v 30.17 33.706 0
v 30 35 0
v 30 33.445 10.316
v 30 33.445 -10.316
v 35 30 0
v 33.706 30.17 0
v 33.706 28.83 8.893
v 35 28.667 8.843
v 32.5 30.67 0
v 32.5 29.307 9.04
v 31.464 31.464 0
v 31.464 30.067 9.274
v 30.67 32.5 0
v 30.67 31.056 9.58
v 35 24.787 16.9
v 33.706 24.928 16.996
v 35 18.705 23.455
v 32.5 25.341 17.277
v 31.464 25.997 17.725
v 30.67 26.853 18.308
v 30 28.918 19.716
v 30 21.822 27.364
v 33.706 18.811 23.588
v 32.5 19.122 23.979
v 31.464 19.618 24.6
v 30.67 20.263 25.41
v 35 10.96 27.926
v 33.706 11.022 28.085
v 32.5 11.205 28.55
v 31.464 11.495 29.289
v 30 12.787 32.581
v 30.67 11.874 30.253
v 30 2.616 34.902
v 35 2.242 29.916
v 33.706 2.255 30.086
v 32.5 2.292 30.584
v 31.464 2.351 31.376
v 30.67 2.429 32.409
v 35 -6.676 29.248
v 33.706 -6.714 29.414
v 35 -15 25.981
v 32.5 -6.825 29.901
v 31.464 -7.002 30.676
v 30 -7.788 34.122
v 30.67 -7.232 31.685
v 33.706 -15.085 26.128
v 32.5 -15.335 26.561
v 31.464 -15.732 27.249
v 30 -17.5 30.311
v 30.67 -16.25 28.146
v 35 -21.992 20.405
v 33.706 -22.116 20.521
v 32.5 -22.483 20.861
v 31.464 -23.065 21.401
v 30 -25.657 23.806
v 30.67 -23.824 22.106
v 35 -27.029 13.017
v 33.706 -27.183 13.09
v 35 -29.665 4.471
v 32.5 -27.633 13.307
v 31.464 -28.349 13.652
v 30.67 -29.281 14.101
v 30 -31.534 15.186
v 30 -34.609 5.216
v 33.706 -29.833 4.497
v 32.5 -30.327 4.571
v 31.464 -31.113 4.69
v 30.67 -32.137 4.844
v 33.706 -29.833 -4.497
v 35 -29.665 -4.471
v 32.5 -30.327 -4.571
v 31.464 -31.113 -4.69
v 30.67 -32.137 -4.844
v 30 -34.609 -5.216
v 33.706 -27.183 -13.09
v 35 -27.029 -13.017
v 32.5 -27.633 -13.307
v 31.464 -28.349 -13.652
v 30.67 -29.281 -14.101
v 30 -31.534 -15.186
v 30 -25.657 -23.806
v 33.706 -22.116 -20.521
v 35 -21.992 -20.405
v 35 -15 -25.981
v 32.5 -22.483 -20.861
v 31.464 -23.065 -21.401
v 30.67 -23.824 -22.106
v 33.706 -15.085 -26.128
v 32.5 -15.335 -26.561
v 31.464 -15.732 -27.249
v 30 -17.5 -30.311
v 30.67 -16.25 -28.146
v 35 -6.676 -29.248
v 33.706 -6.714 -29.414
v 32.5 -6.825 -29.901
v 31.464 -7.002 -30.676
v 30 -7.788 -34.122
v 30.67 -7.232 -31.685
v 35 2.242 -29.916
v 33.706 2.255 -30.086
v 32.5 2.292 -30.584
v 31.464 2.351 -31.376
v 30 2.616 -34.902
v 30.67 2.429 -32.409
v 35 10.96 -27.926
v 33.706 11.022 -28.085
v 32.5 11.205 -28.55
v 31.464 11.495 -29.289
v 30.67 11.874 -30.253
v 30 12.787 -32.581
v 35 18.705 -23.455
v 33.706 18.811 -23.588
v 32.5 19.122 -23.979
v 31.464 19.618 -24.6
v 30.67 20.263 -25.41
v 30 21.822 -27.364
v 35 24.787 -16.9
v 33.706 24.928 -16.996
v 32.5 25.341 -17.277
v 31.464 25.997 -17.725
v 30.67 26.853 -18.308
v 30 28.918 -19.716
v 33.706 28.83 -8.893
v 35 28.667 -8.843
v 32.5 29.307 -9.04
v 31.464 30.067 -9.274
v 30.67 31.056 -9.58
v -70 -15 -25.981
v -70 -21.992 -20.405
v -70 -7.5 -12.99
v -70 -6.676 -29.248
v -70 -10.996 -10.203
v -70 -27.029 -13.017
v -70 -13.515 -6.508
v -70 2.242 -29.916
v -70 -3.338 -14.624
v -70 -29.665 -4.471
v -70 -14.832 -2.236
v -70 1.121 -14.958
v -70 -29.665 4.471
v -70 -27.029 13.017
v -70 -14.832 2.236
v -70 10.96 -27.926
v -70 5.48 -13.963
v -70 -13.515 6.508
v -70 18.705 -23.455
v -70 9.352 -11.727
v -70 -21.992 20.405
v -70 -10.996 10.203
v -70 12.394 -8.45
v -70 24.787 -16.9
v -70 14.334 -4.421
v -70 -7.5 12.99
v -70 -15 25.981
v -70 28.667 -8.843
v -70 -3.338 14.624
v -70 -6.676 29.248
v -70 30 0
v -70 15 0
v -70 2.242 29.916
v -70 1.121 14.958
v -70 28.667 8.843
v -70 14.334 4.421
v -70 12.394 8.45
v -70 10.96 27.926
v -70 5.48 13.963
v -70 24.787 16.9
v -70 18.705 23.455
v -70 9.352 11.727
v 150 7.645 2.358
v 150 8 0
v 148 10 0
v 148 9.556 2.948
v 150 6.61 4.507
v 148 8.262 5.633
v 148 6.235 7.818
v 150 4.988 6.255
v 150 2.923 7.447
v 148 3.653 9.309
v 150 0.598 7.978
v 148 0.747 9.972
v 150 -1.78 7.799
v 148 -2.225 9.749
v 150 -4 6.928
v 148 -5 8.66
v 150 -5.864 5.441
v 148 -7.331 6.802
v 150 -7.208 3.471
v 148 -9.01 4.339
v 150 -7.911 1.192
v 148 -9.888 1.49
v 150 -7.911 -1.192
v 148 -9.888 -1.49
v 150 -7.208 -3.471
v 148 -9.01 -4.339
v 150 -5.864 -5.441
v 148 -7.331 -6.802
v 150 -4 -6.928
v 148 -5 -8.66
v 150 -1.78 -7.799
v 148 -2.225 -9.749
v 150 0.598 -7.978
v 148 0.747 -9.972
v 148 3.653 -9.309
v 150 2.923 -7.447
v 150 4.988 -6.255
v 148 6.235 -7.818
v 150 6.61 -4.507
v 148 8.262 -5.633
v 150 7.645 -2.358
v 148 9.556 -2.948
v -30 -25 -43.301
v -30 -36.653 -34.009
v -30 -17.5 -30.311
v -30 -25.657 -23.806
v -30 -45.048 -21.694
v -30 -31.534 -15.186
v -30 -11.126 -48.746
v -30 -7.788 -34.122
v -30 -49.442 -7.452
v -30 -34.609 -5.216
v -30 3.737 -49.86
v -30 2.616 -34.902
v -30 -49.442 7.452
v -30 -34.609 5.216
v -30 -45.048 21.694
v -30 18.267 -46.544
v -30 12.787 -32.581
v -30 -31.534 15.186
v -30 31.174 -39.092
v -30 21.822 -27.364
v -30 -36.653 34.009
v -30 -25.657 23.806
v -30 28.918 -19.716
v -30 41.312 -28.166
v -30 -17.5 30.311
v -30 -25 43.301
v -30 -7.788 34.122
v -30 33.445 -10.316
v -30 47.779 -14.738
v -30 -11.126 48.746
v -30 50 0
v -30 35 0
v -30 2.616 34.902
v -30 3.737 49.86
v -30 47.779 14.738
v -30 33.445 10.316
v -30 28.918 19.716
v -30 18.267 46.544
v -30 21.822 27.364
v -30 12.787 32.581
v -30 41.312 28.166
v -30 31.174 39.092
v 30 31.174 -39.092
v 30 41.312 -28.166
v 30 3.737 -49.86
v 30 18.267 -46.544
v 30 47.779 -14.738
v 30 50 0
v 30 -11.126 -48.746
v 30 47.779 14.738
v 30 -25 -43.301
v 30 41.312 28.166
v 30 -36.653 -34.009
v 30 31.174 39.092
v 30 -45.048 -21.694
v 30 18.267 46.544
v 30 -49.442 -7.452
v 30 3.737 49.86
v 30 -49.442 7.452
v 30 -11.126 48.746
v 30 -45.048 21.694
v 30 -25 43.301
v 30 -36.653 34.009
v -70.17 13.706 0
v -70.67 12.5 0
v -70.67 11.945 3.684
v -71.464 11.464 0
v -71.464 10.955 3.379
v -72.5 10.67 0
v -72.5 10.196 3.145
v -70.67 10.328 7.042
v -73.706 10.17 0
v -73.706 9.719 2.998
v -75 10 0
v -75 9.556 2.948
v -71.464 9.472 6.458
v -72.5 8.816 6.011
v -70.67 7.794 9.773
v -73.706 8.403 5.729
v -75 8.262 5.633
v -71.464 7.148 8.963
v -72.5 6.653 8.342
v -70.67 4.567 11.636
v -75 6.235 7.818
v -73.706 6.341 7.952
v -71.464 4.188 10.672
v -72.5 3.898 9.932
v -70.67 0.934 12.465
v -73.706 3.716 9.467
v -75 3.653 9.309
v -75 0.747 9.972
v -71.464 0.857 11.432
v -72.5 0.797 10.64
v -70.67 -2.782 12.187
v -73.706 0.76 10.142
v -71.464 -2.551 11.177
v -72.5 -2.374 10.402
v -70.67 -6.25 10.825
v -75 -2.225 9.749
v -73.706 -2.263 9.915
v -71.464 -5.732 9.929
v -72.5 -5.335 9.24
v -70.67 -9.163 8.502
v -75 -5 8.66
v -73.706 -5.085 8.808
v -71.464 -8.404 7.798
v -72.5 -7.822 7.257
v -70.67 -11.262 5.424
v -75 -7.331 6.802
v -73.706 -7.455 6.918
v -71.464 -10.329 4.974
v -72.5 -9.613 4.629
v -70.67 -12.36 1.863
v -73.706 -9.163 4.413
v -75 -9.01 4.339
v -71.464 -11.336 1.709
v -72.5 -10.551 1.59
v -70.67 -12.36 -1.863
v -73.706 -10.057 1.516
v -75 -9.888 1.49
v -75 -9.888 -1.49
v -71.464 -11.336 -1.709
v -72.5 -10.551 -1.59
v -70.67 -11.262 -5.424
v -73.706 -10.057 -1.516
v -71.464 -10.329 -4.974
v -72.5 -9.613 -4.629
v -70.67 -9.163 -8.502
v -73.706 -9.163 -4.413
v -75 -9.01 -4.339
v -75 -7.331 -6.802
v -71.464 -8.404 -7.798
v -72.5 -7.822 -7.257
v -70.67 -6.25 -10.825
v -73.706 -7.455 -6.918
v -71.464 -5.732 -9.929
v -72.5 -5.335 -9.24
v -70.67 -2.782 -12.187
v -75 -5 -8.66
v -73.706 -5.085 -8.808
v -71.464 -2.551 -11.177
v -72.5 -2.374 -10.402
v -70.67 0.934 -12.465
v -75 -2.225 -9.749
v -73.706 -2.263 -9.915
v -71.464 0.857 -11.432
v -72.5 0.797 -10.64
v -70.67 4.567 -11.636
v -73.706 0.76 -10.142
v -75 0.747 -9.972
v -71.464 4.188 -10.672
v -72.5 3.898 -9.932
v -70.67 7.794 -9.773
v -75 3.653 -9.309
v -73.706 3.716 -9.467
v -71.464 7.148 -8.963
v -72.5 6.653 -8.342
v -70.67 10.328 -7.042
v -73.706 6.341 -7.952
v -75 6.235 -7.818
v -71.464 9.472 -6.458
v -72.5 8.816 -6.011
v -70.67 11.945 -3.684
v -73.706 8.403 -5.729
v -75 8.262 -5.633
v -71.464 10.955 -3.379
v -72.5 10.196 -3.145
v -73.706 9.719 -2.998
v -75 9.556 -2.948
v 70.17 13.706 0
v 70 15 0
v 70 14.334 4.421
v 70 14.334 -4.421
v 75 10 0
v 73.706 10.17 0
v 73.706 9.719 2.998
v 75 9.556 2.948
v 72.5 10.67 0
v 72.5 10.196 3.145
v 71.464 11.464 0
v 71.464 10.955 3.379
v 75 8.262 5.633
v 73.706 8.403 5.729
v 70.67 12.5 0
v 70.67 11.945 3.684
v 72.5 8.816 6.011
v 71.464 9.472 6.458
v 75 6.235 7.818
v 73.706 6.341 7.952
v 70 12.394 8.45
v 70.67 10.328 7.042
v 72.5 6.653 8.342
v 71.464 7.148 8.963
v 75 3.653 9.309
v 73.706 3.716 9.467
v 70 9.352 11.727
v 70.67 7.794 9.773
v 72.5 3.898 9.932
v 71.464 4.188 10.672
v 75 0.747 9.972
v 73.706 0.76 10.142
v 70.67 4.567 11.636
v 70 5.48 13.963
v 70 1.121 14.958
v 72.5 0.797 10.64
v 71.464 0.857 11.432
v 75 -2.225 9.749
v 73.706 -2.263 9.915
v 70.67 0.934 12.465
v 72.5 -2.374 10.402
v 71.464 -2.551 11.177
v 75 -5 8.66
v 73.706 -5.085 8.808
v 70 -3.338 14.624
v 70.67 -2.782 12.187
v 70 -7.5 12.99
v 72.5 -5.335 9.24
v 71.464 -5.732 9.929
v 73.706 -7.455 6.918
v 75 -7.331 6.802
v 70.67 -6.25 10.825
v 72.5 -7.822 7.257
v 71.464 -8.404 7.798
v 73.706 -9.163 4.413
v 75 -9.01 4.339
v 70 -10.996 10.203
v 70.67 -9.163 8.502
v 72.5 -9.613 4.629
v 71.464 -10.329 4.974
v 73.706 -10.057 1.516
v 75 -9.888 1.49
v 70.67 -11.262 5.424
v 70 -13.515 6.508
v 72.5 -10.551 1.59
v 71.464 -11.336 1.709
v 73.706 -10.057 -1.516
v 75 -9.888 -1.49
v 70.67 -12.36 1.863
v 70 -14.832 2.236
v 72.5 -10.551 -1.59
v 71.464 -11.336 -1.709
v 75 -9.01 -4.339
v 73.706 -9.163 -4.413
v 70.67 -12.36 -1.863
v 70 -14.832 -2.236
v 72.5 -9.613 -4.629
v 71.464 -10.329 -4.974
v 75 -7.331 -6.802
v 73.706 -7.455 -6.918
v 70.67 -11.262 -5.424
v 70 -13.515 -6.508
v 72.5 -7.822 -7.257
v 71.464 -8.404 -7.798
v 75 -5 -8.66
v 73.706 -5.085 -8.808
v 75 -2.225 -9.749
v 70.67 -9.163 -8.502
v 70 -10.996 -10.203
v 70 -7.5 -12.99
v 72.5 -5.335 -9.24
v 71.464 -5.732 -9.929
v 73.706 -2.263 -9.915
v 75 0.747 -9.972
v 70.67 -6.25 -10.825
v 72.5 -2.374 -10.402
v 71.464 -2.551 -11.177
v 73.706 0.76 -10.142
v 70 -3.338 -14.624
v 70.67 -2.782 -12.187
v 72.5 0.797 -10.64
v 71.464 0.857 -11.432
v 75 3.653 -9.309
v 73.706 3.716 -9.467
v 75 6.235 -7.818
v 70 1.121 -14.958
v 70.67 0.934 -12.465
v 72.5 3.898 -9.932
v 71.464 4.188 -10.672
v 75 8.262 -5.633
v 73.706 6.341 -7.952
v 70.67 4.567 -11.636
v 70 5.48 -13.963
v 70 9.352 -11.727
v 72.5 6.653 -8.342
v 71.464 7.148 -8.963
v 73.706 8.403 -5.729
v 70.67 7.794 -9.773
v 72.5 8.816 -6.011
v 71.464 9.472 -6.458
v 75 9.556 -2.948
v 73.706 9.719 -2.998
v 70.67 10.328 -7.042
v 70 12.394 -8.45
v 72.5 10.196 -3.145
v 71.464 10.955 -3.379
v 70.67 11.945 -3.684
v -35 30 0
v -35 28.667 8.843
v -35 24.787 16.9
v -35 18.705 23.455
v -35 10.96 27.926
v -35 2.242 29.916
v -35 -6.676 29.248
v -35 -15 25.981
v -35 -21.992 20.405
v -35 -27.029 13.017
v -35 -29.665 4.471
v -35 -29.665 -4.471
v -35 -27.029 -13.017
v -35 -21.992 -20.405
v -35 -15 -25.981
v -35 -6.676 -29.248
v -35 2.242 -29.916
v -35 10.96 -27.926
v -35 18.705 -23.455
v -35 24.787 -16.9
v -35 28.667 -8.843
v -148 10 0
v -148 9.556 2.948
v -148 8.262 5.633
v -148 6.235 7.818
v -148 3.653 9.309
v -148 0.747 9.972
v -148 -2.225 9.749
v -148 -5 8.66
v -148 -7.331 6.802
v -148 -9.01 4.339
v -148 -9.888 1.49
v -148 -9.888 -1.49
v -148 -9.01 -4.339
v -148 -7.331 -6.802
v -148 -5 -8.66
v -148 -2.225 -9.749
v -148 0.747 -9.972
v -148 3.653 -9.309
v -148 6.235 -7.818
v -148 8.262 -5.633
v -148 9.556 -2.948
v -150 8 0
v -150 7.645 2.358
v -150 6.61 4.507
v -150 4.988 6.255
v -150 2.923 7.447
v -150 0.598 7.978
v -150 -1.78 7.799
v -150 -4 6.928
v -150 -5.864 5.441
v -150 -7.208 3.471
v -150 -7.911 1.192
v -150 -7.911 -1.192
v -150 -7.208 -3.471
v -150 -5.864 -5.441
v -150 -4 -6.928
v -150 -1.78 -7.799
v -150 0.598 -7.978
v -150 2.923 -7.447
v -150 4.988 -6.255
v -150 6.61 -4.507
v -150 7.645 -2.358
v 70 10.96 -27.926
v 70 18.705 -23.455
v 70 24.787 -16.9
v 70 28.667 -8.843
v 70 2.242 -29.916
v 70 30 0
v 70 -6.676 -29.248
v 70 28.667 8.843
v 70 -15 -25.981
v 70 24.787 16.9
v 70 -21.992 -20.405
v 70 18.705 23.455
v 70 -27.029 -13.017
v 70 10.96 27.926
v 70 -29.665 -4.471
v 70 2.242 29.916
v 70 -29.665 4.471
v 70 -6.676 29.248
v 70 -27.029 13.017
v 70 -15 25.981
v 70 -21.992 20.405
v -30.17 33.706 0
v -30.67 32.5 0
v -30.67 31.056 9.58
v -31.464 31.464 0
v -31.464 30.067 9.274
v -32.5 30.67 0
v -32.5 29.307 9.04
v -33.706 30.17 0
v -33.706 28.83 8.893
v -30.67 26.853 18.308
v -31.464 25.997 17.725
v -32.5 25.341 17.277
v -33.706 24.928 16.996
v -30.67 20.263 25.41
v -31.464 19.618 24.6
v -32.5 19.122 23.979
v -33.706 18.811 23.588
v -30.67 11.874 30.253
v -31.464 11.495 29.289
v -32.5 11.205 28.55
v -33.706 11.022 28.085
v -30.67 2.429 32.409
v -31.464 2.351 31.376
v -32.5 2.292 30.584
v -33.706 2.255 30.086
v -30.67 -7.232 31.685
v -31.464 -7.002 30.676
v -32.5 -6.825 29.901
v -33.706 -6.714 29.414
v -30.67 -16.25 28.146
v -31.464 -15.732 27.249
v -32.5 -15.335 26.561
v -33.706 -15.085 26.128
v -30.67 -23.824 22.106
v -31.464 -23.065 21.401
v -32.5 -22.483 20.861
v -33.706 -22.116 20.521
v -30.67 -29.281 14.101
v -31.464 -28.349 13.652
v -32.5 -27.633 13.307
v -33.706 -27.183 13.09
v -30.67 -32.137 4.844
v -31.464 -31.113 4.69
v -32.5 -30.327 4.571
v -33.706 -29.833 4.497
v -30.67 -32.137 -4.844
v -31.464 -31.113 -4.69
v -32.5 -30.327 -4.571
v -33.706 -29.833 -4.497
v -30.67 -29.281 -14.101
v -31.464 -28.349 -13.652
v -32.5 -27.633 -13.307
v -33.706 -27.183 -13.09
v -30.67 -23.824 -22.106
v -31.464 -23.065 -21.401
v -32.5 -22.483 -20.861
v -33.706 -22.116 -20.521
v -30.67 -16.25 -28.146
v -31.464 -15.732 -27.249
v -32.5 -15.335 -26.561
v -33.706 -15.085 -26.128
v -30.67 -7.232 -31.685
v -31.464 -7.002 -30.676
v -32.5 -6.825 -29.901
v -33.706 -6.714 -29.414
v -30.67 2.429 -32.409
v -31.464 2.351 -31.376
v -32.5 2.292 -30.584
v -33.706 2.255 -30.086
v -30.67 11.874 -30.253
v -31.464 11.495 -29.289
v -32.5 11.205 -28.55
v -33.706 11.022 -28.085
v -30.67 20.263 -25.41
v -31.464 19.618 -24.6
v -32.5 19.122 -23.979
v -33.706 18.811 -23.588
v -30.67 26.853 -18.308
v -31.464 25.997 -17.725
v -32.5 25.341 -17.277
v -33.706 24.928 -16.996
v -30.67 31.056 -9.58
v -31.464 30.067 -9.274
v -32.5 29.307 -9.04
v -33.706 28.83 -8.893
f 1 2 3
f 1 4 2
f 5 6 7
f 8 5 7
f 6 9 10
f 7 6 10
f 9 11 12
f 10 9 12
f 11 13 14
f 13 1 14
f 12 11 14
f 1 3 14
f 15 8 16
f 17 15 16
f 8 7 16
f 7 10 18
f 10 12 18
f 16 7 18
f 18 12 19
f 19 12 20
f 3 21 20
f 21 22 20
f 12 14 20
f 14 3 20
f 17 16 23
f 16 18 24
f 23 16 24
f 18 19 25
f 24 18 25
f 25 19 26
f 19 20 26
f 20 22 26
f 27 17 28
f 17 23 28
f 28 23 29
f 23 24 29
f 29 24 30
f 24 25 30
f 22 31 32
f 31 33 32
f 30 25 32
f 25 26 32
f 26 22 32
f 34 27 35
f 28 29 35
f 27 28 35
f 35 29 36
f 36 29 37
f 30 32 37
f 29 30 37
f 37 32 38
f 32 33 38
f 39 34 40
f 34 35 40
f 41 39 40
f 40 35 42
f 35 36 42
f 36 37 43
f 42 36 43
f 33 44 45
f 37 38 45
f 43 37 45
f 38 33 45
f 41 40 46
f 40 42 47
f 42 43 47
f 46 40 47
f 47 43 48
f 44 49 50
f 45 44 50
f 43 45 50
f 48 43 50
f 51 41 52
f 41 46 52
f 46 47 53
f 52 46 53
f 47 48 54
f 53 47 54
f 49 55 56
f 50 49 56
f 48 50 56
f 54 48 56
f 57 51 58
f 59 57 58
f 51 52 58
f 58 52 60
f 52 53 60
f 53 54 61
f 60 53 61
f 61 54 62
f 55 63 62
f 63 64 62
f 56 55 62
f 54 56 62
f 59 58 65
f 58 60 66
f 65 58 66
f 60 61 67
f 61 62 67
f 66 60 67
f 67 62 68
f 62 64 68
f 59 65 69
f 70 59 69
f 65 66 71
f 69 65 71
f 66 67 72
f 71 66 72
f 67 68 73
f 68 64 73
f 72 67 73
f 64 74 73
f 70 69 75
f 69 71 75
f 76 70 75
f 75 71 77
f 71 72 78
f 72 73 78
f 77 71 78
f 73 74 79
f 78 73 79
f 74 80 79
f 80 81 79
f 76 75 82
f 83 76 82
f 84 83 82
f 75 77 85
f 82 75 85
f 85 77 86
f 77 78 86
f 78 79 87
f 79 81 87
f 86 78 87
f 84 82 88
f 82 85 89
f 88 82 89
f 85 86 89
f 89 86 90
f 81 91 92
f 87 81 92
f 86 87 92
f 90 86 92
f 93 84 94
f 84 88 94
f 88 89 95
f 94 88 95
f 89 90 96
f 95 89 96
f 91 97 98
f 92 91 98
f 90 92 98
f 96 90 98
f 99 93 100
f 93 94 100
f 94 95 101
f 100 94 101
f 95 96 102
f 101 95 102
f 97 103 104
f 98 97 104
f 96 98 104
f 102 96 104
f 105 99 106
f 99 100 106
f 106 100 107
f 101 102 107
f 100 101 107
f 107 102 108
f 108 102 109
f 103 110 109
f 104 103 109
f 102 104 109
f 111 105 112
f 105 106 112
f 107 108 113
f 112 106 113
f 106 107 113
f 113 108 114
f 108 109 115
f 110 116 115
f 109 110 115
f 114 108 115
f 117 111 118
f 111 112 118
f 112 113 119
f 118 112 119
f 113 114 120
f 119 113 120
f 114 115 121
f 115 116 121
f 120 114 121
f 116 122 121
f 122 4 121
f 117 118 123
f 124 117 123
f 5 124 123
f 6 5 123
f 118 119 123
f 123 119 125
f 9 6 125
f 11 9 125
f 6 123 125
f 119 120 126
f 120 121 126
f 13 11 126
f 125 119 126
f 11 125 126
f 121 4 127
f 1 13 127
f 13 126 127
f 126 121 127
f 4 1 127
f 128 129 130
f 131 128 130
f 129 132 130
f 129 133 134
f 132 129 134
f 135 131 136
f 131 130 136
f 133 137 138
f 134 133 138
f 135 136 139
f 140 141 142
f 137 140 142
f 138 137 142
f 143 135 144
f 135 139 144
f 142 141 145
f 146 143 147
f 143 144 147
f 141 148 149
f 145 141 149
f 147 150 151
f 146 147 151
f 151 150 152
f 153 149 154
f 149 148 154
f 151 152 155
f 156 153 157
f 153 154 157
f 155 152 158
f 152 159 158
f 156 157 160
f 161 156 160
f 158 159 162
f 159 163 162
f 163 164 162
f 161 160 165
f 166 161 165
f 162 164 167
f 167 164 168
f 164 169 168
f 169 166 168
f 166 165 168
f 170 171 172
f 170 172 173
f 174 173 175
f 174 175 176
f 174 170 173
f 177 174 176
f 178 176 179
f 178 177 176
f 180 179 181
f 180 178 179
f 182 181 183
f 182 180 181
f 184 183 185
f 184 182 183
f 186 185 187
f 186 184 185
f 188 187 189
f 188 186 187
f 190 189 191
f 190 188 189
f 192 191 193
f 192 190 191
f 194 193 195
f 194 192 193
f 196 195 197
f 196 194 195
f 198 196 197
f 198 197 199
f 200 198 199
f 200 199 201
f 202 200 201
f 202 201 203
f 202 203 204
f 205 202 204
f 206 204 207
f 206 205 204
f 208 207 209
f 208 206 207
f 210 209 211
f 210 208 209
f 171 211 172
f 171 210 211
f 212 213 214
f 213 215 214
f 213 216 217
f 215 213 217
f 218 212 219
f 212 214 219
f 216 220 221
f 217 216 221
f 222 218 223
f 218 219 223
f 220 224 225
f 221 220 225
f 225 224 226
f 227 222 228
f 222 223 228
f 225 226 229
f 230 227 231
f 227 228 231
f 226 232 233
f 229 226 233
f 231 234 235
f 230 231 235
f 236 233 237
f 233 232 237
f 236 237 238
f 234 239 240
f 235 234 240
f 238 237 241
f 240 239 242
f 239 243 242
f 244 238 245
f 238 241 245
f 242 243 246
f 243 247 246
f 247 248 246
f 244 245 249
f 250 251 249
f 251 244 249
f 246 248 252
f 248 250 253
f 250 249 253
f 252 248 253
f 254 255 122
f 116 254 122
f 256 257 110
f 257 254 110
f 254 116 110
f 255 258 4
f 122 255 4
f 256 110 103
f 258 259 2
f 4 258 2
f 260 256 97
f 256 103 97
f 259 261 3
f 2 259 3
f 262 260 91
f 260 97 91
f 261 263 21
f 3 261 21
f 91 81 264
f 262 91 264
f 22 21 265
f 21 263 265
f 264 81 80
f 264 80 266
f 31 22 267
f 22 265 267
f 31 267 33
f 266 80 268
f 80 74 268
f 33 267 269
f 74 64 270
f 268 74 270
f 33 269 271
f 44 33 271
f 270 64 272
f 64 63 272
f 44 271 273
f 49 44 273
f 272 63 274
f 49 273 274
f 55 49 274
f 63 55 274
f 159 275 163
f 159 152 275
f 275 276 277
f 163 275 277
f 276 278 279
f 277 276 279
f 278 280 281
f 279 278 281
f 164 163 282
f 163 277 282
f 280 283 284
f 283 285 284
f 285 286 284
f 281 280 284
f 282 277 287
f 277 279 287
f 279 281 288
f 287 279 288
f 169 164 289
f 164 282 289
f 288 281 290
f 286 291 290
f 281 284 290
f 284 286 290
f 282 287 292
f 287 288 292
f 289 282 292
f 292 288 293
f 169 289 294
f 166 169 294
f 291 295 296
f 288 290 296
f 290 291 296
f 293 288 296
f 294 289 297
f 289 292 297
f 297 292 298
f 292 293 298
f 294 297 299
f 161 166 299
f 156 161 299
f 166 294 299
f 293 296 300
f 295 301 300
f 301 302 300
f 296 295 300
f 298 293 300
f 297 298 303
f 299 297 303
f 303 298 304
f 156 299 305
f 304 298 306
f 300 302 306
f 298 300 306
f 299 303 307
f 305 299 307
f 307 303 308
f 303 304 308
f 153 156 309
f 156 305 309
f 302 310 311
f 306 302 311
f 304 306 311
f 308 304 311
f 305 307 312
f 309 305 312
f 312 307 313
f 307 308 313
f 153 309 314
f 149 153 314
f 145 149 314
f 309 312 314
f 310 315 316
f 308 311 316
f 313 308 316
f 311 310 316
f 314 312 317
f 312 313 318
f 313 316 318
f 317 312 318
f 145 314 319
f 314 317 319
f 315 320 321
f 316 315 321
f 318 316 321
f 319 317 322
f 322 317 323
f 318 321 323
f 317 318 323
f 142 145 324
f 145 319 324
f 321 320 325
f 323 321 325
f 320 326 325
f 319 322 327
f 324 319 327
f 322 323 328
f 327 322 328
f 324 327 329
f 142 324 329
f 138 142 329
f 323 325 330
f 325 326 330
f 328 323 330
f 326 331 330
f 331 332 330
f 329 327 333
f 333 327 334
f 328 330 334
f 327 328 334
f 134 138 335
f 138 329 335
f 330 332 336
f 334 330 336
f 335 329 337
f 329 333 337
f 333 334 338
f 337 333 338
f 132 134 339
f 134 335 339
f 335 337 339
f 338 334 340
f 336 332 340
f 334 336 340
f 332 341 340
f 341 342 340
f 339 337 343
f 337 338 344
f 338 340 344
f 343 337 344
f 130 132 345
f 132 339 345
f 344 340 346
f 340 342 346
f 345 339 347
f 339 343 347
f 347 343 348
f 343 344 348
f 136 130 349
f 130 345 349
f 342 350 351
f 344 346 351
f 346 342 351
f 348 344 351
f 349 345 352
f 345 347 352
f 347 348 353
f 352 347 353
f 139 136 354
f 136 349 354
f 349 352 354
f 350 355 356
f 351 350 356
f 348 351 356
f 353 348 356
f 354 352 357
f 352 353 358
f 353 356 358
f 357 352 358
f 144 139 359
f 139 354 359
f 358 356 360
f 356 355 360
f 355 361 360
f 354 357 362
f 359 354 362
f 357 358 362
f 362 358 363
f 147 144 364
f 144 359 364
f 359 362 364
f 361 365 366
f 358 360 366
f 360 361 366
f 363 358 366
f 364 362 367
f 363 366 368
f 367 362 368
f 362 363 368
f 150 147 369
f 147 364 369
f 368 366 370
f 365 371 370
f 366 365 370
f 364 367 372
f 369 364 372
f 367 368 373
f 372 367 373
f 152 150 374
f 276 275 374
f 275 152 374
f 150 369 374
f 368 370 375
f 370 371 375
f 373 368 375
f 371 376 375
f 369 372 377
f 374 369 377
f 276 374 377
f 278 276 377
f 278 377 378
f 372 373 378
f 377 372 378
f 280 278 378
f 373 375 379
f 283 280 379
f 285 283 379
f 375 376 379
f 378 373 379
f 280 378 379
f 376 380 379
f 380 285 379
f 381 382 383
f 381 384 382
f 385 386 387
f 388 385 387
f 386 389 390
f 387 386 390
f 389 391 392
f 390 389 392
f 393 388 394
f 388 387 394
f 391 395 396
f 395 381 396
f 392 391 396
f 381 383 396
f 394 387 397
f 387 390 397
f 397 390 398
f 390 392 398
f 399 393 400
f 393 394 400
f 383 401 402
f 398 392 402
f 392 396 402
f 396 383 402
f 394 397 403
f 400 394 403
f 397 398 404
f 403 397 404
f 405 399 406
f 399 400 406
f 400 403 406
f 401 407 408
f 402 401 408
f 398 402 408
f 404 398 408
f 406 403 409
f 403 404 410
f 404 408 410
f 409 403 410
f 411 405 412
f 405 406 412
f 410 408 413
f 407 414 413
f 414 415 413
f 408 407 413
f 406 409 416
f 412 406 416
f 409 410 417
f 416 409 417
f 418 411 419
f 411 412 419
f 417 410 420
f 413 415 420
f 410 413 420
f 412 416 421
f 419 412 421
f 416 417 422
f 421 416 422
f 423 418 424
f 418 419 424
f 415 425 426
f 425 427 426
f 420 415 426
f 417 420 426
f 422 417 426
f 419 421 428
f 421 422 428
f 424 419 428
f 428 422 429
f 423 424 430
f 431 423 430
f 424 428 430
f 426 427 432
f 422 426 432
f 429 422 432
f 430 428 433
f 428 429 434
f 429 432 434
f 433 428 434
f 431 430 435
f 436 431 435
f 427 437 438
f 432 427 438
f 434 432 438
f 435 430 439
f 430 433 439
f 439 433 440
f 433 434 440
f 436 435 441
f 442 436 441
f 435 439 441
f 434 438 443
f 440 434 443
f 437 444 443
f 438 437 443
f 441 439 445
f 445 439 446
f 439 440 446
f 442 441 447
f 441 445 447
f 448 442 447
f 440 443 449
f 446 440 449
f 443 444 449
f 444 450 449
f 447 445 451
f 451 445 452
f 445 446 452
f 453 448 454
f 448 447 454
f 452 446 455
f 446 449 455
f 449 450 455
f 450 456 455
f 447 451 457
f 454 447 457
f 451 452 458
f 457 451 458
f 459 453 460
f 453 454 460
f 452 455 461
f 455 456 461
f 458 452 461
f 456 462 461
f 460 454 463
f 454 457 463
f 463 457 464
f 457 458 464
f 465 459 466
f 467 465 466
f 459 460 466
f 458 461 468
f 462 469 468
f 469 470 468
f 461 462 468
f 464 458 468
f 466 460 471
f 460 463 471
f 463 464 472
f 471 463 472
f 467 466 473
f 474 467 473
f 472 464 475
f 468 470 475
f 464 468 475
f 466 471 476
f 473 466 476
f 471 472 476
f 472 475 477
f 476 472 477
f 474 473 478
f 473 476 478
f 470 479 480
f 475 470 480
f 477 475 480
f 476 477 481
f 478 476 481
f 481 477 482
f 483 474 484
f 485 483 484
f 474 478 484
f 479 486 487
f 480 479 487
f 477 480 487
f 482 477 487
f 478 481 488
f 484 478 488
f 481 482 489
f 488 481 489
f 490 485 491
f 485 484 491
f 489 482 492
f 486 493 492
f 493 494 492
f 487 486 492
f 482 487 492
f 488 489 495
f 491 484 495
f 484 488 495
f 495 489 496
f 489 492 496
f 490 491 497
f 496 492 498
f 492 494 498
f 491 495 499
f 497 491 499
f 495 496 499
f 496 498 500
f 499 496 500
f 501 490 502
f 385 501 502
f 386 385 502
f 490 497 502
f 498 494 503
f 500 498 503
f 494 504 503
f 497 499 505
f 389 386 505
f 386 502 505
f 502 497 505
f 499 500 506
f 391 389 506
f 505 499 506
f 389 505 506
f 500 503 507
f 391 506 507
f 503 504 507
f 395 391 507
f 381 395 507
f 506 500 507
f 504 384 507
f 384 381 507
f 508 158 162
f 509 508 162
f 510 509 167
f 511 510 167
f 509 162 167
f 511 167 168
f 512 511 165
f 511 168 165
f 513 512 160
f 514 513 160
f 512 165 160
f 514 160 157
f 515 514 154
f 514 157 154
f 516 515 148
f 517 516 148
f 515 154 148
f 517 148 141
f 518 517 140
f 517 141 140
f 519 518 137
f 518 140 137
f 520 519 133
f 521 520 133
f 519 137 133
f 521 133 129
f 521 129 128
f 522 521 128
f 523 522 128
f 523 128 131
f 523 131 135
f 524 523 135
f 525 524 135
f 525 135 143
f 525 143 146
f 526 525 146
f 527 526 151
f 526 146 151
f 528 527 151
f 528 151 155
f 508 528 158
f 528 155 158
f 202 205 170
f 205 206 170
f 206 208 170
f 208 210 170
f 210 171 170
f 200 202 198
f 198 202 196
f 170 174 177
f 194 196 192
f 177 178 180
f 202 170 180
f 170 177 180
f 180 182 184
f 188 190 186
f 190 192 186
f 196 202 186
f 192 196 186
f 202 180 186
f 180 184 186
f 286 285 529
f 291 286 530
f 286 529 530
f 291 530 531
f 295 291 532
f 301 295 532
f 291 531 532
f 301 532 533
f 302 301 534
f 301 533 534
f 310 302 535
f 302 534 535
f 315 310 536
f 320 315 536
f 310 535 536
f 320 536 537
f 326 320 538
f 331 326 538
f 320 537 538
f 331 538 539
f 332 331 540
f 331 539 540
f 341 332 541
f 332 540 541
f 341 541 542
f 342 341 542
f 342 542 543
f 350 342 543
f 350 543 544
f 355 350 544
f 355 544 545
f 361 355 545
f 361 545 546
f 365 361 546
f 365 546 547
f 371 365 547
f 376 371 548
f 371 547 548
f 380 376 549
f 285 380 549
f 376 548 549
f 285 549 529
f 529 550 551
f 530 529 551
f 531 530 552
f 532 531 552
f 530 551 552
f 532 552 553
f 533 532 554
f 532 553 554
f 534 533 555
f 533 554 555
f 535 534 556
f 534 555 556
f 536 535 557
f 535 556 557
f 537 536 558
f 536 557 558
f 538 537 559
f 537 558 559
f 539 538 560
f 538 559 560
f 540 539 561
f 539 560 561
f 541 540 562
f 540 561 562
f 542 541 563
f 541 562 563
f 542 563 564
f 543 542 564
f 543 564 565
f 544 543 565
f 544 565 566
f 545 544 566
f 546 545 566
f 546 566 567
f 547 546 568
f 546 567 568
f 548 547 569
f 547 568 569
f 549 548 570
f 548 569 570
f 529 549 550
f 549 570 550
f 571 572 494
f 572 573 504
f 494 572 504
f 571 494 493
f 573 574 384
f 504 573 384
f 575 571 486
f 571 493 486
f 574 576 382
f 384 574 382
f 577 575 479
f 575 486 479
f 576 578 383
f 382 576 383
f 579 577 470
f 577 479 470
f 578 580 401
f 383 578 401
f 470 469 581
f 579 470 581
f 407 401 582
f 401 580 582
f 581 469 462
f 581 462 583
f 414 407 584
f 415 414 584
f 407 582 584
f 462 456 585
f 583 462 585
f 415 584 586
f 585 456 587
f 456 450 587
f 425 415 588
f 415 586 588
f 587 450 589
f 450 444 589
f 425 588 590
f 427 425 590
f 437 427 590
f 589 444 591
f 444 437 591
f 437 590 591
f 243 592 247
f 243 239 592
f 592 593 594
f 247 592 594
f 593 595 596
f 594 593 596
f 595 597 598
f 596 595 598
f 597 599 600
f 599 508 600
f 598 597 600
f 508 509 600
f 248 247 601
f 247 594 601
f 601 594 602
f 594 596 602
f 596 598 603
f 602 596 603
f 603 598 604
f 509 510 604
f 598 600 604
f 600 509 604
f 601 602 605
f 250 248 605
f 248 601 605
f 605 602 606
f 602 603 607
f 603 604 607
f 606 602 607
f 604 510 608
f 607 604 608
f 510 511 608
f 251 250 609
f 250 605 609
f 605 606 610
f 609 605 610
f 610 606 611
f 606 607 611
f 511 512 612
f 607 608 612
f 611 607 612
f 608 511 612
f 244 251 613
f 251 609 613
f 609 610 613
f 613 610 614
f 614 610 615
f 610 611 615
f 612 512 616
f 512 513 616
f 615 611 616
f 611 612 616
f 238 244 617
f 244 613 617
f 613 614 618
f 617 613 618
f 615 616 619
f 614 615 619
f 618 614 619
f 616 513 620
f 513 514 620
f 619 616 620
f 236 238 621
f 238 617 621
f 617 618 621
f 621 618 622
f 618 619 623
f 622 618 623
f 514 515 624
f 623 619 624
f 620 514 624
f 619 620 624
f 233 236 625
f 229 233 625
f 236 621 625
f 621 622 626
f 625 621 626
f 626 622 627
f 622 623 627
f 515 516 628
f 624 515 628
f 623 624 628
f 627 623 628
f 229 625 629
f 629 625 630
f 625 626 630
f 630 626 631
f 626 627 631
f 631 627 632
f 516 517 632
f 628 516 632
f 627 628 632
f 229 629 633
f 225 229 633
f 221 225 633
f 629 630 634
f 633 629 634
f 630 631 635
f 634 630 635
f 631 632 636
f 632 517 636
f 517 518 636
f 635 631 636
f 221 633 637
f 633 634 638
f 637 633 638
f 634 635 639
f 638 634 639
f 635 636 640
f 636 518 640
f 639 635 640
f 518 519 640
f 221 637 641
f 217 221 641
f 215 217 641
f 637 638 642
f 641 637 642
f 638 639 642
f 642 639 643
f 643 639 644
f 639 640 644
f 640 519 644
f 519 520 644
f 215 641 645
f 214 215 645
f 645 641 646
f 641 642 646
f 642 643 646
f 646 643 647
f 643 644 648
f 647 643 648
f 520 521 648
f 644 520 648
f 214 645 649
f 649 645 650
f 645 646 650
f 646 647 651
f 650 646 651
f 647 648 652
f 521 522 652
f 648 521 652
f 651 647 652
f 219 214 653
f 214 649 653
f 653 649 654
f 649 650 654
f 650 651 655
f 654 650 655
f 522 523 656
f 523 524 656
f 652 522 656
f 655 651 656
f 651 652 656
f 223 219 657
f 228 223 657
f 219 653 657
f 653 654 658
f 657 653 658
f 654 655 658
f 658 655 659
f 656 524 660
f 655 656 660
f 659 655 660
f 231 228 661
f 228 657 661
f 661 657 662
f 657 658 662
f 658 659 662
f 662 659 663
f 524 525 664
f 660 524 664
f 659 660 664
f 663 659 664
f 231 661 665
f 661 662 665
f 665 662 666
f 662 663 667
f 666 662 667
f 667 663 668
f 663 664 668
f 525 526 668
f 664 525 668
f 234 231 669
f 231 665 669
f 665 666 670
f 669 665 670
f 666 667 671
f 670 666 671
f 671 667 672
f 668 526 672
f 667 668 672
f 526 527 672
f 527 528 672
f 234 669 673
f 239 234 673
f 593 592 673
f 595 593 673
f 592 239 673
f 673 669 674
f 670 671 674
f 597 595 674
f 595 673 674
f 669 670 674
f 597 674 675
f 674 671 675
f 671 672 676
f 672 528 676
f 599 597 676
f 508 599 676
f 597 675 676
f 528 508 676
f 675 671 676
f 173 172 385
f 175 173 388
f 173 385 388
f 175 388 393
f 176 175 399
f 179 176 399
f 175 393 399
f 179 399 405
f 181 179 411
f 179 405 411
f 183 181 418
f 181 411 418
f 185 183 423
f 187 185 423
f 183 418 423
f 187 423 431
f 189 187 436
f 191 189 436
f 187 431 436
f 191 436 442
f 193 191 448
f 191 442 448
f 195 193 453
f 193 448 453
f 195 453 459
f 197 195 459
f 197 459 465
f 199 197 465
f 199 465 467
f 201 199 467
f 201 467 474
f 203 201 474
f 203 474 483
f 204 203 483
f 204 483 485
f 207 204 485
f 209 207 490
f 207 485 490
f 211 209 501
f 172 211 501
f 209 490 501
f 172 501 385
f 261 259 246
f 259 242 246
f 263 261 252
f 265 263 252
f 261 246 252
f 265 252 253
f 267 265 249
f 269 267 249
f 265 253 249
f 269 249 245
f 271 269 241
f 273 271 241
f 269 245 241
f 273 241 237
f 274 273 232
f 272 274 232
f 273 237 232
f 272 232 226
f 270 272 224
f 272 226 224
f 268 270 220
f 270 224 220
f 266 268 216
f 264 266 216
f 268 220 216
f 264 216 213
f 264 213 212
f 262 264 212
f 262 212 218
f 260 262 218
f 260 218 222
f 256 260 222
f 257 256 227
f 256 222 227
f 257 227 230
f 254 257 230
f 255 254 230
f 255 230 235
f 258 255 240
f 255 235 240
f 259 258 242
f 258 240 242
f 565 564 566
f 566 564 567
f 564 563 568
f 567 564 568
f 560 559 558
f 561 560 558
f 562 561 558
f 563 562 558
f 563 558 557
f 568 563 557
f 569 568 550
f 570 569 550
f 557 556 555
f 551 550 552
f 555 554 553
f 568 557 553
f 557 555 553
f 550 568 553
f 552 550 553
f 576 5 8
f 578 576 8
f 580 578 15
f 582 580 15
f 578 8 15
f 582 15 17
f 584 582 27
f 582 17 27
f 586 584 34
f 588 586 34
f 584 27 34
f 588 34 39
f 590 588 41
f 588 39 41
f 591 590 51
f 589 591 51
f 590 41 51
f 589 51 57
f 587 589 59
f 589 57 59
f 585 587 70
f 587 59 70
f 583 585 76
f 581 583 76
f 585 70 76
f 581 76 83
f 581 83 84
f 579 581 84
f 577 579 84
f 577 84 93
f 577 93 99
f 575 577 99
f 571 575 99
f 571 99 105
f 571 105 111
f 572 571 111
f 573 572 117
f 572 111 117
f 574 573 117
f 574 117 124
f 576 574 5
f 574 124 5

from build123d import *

# Parameters (mm, degrees)
F2_R    = 5
F3_SIZE = 2
F4_R    = 5


with BuildPart() as f1:
    # F0 (on Top) → F1 (revolve)
    with BuildSketch(Plane.XY):
        Polygon((-150, 10), (-150, 0), (150, 0), (150, 10), (70, 10), (70, 30), (30, 30), (30, 50), (-30, 50), (-30, 30), (-70, 30), (-70, 10), align=None)
    revolve(axis=Axis((0, 0, 0), (1, 0, 0)))

    # F2
    f2_edges = [f1.edges().sort_by_distance(p)[0] for p in [
        (-30, -30, 0),
        (30, -30, 0),
    ]]
    fillet(f2_edges, radius=F2_R)

    # F3
    f3_edges = [f1.edges().sort_by_distance(p)[0] for p in [
        (-150, -10, 0),
        (150, -10, 0),
    ]]
    chamfer(f3_edges, length=F3_SIZE)

    # F4
    f4_edges = [f1.edges().sort_by_distance(p)[0] for p in [
        (-70, -10, 0),
        (70, -10, 0),
    ]]
    fillet(f4_edges, radius=F4_R)


solid = f1.part
